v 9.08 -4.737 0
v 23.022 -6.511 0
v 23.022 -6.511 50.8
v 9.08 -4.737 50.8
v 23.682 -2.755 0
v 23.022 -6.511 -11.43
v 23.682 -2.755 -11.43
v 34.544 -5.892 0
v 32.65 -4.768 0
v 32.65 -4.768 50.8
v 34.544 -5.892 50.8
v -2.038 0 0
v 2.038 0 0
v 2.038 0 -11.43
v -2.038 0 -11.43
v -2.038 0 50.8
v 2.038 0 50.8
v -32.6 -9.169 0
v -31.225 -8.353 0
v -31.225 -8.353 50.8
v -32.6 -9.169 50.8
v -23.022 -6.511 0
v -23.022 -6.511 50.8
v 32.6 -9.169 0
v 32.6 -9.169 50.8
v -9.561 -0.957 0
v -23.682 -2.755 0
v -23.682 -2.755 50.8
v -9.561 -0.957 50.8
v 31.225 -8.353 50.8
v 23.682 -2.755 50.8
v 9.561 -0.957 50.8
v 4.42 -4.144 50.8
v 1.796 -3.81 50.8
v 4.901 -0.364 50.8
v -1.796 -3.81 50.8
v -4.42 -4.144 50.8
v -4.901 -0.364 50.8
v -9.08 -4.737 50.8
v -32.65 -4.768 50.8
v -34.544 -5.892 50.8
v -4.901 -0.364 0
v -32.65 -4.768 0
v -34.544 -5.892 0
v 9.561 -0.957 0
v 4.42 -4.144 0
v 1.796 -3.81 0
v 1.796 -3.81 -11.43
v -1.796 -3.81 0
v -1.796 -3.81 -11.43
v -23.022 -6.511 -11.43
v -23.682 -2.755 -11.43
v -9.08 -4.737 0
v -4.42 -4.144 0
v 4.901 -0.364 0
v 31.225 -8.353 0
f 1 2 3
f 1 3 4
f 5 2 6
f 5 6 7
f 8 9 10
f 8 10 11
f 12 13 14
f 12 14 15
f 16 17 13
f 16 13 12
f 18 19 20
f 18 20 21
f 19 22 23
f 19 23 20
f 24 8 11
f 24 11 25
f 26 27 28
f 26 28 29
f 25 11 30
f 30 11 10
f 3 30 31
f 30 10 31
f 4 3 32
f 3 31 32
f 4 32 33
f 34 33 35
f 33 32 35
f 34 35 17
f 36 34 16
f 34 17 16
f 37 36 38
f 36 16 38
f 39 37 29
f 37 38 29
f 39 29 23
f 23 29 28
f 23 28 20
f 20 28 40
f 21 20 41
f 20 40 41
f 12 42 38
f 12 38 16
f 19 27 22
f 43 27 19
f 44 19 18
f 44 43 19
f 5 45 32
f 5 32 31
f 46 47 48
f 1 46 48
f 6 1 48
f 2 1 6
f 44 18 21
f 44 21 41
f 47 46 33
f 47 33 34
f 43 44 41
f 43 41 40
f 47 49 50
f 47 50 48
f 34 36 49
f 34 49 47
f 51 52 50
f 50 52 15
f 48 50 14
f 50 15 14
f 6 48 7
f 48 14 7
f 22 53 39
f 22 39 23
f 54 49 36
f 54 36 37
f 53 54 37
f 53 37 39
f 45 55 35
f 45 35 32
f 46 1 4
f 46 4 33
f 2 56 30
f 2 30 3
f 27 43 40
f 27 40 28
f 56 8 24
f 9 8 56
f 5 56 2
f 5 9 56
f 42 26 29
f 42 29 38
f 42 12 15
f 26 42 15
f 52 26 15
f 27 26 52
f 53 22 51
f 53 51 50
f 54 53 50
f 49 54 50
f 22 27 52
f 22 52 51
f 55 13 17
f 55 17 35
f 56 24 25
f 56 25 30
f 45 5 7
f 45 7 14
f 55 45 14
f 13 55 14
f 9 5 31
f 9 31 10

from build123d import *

# Parameters (mm, degrees)
BOSS_EXTRUDE1_DEPTH = 50.8
BOSS_EXTRUDE2_DEPTH = 11.43


with BuildPart() as part:
    # Sketch1 → Boss-Extrude1 (new body)
    with BuildSketch(Plane.XY):
        Polygon((-2.037826091, 0), (2.037826091, 0), (4.901371199, -0.364452471), (9.560729749, -0.957463816), (23.681538514, -2.754663947), (32.64962373, -4.768284593), (34.544, -5.892440119), (32.599653531, -9.168965231), (31.225129901, -8.353299221), (23.022216919, -6.511484102), (9.079699287, -4.736975649), (4.420340738, -4.143964304), (1.796344675, -3.81), (-1.796344675, -3.81), (-4.420340738, -4.143964304), (-9.079699287, -4.736975649), (-23.022216919, -6.511484102), (-31.225129901, -8.353299221), (-32.599653531, -9.168965231), (-34.544, -5.892440119), (-32.64962373, -4.768284593), (-23.681538514, -2.754663947), (-9.560729749, -0.957463816), (-4.901371199, -0.364452471), align=None)
    extrude(amount=BOSS_EXTRUDE1_DEPTH)

    # Sketch2 → Boss-Extrude2 (add)
    with BuildSketch(Plane(origin=(0, 0, 0), x_dir=(-1, 0, 0), z_dir=(0, 0, -1))):
        Polygon((23.022216919, -6.511484102), (1.796344675, -3.81), (-1.796344675, -3.81), (-23.022216919, -6.511484102), (-23.681538514, -2.754663947), (-2.037826091, 0), (2.037826091, 0), (23.681538514, -2.754663947), align=None)
    extrude(amount=BOSS_EXTRUDE2_DEPTH)


solid = part.part
